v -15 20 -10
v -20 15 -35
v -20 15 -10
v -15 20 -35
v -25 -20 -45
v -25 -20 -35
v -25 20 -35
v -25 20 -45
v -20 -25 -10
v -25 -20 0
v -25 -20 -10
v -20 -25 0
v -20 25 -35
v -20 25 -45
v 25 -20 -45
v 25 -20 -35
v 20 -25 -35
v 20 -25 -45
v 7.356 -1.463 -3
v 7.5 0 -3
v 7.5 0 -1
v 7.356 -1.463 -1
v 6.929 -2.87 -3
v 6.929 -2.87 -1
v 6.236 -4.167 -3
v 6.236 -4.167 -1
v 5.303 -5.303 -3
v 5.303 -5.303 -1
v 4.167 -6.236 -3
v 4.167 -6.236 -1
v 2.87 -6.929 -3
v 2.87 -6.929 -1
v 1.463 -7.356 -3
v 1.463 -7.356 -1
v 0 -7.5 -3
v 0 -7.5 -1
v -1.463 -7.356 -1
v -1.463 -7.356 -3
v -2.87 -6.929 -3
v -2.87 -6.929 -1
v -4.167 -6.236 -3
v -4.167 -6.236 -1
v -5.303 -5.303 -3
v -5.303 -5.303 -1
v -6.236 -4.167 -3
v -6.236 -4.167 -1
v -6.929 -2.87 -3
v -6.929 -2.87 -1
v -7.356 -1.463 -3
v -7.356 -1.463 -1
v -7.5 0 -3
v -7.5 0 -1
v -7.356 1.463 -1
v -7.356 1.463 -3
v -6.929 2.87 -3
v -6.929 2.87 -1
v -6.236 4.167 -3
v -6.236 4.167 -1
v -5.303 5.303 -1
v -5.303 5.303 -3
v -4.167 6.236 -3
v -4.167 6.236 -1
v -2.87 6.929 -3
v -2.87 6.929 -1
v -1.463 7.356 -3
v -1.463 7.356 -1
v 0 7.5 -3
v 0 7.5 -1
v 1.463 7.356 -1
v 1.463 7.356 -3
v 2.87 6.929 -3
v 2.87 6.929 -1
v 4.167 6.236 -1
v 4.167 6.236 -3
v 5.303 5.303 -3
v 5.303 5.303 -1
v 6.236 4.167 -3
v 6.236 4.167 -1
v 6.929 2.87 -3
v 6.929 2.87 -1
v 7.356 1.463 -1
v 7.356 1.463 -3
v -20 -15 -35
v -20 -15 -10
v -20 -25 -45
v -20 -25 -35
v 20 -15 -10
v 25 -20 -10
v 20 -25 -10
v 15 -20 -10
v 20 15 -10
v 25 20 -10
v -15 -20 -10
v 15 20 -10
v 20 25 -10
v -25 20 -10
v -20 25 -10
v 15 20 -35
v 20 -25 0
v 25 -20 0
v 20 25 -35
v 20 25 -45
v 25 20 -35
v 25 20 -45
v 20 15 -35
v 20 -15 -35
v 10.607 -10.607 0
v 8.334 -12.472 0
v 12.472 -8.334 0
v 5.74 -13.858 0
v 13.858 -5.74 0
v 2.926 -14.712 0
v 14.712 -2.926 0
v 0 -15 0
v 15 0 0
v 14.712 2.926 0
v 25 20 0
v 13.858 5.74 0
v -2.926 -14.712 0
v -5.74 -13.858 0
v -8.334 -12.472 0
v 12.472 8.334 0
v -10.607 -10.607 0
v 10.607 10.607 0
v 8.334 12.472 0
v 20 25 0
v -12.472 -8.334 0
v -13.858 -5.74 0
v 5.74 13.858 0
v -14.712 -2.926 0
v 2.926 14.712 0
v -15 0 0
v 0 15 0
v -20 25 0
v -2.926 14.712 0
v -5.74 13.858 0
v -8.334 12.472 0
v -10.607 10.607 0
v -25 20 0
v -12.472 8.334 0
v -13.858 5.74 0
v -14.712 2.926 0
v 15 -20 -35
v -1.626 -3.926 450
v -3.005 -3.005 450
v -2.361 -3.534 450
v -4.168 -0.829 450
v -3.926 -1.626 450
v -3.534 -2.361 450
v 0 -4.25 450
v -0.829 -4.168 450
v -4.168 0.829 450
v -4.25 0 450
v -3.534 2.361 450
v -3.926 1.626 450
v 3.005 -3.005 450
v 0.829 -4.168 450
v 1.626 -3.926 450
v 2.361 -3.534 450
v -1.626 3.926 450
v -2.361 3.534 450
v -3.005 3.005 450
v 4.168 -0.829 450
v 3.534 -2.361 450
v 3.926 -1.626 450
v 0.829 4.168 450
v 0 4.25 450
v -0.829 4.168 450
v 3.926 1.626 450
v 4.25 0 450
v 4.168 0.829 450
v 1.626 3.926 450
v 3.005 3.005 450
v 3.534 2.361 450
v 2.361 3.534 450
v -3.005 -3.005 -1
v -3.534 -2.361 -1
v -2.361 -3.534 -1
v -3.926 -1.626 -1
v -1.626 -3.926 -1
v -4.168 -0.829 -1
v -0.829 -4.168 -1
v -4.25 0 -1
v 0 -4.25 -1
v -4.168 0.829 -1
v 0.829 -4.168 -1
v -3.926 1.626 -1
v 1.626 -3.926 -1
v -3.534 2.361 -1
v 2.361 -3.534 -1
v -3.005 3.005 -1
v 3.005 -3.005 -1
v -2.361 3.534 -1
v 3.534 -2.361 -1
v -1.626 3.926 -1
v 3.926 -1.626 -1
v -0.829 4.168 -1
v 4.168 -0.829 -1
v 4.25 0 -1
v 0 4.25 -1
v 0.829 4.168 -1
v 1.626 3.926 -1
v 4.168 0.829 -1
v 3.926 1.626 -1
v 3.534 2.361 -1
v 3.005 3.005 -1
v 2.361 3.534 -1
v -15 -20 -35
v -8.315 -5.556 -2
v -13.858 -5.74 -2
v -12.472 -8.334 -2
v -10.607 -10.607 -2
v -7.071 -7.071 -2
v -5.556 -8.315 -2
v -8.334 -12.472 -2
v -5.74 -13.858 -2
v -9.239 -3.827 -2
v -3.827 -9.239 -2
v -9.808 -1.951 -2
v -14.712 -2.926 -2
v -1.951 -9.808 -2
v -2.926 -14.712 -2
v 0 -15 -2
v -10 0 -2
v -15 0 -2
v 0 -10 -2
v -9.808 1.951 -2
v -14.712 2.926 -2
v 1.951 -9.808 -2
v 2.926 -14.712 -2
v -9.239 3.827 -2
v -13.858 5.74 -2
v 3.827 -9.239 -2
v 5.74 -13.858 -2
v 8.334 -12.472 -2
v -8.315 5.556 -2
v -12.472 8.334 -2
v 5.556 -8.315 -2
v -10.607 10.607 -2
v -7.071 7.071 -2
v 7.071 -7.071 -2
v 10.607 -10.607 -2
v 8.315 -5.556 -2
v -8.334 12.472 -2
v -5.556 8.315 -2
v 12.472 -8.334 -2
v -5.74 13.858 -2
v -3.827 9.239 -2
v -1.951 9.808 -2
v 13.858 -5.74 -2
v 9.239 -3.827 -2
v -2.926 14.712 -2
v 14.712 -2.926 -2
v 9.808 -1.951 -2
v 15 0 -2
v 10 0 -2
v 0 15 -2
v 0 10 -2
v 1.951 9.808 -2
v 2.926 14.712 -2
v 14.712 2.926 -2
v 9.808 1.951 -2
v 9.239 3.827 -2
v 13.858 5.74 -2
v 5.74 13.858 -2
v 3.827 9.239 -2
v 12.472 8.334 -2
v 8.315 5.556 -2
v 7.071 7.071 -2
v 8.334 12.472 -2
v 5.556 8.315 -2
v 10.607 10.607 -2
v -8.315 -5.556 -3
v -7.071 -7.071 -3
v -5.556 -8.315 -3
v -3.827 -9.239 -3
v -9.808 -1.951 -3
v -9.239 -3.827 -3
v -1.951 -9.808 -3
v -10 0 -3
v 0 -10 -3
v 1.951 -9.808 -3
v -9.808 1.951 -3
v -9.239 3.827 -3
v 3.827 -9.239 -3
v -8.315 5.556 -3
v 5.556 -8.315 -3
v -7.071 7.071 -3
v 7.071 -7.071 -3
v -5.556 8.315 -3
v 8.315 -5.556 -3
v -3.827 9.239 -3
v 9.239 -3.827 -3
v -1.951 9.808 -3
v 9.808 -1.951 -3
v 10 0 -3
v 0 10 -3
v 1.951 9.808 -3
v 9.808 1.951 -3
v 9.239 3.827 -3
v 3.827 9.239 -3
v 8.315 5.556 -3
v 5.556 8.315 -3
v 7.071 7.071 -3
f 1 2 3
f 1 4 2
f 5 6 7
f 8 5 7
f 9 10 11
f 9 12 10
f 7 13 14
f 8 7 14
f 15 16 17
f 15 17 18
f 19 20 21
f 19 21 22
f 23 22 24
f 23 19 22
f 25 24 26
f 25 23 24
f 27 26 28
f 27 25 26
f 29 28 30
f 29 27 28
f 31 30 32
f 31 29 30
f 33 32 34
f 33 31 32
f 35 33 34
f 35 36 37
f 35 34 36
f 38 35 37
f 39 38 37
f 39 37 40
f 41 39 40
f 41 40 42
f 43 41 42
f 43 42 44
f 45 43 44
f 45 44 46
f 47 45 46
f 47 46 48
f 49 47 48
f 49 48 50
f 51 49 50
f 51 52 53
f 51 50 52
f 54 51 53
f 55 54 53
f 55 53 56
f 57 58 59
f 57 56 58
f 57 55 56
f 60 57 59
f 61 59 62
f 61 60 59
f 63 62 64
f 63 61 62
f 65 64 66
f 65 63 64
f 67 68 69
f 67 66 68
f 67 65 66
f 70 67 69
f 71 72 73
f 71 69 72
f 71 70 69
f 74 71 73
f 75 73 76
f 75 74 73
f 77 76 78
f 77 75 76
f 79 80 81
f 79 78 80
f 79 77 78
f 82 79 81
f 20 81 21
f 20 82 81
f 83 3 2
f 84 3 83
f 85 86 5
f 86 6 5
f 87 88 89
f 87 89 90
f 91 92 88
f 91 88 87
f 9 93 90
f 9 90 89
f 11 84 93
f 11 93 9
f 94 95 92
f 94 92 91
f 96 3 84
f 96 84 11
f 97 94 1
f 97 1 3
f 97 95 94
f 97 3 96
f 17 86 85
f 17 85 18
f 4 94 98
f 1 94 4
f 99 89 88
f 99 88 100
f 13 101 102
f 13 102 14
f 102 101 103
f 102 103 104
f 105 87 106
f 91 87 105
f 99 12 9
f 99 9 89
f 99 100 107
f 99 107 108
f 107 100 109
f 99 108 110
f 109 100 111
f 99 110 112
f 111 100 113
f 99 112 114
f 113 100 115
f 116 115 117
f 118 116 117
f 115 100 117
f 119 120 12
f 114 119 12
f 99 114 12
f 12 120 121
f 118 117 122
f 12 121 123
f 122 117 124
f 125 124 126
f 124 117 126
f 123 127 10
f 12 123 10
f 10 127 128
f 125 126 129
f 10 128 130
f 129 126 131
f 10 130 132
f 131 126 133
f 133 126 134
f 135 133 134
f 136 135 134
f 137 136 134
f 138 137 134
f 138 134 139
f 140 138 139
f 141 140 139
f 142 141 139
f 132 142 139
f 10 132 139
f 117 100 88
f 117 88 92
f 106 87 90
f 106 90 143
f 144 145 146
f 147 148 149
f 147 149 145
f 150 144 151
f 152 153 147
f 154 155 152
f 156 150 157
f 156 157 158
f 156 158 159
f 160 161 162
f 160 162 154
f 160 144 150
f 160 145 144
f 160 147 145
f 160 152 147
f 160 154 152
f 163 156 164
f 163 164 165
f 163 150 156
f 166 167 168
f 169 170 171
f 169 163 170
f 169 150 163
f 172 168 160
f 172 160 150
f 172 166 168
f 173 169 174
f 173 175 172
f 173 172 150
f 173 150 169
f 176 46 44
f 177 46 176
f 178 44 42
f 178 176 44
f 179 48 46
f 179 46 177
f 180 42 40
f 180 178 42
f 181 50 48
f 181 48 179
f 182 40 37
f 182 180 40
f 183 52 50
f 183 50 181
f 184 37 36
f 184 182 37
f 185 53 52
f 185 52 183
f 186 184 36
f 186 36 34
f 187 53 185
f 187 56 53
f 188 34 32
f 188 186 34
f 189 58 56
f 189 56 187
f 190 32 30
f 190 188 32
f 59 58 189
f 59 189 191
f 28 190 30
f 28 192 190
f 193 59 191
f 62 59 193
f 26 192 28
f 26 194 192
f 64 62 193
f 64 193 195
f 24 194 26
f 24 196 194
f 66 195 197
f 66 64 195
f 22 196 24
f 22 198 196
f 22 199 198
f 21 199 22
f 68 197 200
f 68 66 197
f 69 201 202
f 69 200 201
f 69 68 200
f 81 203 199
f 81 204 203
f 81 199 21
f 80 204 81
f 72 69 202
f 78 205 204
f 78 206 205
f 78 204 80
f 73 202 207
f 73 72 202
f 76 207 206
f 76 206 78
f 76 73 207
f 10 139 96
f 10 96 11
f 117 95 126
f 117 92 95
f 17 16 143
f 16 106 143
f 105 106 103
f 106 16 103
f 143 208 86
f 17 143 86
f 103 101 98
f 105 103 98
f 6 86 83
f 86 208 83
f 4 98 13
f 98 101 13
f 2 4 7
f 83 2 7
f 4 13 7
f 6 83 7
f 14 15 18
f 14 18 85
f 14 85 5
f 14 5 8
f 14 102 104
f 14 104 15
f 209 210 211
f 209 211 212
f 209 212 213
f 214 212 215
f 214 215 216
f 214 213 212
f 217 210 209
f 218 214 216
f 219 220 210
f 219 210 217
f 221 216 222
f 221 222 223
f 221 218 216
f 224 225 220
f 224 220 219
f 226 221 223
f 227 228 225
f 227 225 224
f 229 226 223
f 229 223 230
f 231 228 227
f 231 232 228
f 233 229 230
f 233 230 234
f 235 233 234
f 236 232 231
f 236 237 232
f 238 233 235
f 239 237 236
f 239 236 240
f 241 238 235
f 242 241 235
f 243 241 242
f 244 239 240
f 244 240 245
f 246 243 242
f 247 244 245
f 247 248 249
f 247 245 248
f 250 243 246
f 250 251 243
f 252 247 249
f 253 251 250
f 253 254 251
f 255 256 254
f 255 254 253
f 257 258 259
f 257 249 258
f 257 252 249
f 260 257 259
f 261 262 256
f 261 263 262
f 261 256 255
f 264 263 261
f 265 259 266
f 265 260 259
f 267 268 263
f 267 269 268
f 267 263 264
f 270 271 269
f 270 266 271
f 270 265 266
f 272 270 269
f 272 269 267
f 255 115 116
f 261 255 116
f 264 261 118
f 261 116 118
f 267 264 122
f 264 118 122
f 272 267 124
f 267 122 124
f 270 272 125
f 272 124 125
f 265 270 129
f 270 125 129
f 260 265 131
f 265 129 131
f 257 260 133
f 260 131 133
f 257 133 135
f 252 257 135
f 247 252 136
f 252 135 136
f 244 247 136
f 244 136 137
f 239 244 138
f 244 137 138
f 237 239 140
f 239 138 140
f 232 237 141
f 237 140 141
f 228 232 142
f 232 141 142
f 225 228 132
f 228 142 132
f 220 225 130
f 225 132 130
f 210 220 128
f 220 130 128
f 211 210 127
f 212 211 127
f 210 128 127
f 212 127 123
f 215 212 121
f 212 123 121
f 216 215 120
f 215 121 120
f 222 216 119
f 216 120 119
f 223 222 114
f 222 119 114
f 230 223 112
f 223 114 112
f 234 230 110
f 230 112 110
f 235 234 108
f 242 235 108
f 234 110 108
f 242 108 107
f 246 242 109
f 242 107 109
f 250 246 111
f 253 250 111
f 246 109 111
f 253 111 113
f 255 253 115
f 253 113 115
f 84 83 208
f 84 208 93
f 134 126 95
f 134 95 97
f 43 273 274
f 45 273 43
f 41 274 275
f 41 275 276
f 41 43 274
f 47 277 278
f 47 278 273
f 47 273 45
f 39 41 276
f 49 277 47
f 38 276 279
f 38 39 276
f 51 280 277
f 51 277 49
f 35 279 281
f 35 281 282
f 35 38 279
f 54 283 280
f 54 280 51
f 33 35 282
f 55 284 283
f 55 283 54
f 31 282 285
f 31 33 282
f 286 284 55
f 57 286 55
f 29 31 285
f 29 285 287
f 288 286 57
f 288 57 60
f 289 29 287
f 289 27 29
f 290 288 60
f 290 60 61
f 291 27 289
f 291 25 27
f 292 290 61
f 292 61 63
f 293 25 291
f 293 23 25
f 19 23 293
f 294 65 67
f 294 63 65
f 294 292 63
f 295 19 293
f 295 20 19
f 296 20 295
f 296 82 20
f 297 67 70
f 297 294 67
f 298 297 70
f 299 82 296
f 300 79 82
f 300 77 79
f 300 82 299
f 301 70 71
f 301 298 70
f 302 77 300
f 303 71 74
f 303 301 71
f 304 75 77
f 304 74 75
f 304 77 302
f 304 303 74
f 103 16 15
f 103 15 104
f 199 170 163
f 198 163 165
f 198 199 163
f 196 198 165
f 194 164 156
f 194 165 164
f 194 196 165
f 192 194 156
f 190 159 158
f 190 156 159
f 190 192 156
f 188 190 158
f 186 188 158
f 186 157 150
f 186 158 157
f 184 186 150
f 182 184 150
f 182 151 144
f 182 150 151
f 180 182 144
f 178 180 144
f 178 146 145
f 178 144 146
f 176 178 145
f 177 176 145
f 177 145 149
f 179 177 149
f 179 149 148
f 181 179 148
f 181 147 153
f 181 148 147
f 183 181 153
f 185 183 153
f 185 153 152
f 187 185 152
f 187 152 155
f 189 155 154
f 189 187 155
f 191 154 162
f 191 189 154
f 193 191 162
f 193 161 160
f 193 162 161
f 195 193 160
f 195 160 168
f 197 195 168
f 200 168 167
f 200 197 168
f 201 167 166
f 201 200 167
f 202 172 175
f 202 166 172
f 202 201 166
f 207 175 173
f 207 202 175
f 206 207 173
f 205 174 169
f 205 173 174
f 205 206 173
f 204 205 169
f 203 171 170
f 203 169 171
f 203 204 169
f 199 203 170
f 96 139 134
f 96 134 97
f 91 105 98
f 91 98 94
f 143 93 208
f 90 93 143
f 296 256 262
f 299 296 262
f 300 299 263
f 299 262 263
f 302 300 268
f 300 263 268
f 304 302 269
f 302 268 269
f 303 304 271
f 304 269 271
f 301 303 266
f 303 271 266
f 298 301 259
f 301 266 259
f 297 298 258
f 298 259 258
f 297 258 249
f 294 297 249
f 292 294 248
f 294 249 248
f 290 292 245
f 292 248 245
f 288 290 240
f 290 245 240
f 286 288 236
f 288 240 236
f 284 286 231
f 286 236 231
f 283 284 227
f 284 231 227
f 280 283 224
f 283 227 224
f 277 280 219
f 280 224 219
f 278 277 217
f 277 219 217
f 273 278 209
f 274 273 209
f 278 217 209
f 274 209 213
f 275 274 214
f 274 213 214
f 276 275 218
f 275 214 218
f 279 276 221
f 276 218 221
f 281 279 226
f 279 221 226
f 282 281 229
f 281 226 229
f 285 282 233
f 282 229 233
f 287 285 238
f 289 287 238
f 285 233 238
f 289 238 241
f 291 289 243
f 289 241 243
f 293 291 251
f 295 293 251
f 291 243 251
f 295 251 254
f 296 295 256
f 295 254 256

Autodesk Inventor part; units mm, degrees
ref_plane "YZ Plane" through (0, 0, 0) normal (1, 0, 0) x (0, 1, 0)
ref_plane "XZ Plane" through (0, 0, 0) normal (0, 1, 0) x (-1, 0, 0)
ref_plane "XY Plane" through (0, 0, 0) normal (0, 0, 1) x (1, 0, 0)
sketch "草图1" plane through (0, 0, 0) normal (0, 0, 1) x (1, 0, 0)
  circle A0 centre (0, 0) radius 4.25
  dimension "d0" = 8.5
extrude "拉伸1" add sketch "草图1" along normal blind 450
sketch "草图2" plane through (0, 0, 0) normal (0, 0, -1) x (-1, 0, 0)
  line L0 (-25, 25) -> (25, 25)
  line L1 (25, 25) -> (25, -25)
  line L2 (25, -25) -> (-25, -25)
  line L3 (-25, -25) -> (-25, 25)
  circle A0 centre (0, 0) radius 4.25 projected
  line L4 (-25, 25) -> (25, -25) construction
  line L5 (25, 25) -> (-25, -25) construction
  dimension "d3" = 50
  dimension "d4" = 50
extrude "拉伸2" add sketch "草图2" along normal blind 10 contours L0 L1 L2 L3 | A0
sketch "草图3" plane through (0, 0, 0) normal (0, 0, 1) x (1, 0, 0)
  circle A0 centre (0, 0) radius 15
  dimension "d7" = 30
extrude "拉伸3" cut sketch "草图3" against normal blind 2
sketch "草图4" plane through (0, 0, -2) normal (0, 0, 1) x (1, 0, 0)
  circle A0 centre (0, 0) radius 10
  dimension "d10" = 20
extrude "拉伸4" cut sketch "草图4" against normal blind 1
sketch "草图5" plane through (0, 0, -3) normal (0, 0, 1) x (1, 0, 0)
  circle A0 centre (0, 0) radius 7.5
  dimension "d13" = 15
extrude "拉伸5" add sketch "草图5" along normal blind 2
sketch "草图6" plane through (0, 0, -1) normal (0, 0, 1) x (1, 0, 0)
  circle A0 centre (0, 0) radius 4.25 projected
extrude "拉伸6" add sketch "草图6" along normal blind 2
sketch "草图7" plane through (0, 0, -10) normal (0, 0, -1) x (-1, 0, 0)
  line L0 (-20, 20) -> (20, 20)
  line L1 (20, 20) -> (20, -20)
  line L2 (20, -20) -> (-20, -20)
  line L3 (-20, -20) -> (-20, 20)
  line L4 (-20, 20) -> (20, -20) construction
  line L5 (20, 20) -> (-20, -20) construction
  point P0 (0, 0)
  dimension "d18" = 40
  dimension "d19" = 40
extrude "拉伸7" add sketch "草图7" along normal blind 25
sketch "草图8" plane through (0, 0, -35) normal (0, 0, -1) x (-1, 0, 0)
  line L0 (25, -25) -> (25, 25) projected
  line L1 (-25, 25) -> (25, 25)
  line L2 (25, 25) -> (25, -25)
  line L3 (25, -25) -> (-25, -25)
  line L4 (-25, -25) -> (-25, 25)
  circle A0 centre (0, 0) radius 7.5 projected
  line L5 (-25, 25) -> (25, -25) construction
  line L6 (25, 25) -> (-25, -25) construction
  dimension "d22" = 50
  dimension "d23" = 50
extrude "拉伸8" add sketch "草图8" along normal blind 10 contours L3 L4 L1 L0 | A0
chamfer "倒角1" distance 5 angle 45 12 edges at (20, -20, -22.5) (25, -25, -5) (25, -25, -40) (-25, -25, -40) (-20, -20, -22.5) (-25, -25, -5) (25, 25, -5) (20, 20, -22.5) (25, 25, -40) (-20, 20, -22.5) (-25, 25, -5) (-25, 25, -40)
thread "螺纹1" size "M9x1.25" class "6g" standard "ANSI Metric M Profile" full length
properties part number "步进电机"
